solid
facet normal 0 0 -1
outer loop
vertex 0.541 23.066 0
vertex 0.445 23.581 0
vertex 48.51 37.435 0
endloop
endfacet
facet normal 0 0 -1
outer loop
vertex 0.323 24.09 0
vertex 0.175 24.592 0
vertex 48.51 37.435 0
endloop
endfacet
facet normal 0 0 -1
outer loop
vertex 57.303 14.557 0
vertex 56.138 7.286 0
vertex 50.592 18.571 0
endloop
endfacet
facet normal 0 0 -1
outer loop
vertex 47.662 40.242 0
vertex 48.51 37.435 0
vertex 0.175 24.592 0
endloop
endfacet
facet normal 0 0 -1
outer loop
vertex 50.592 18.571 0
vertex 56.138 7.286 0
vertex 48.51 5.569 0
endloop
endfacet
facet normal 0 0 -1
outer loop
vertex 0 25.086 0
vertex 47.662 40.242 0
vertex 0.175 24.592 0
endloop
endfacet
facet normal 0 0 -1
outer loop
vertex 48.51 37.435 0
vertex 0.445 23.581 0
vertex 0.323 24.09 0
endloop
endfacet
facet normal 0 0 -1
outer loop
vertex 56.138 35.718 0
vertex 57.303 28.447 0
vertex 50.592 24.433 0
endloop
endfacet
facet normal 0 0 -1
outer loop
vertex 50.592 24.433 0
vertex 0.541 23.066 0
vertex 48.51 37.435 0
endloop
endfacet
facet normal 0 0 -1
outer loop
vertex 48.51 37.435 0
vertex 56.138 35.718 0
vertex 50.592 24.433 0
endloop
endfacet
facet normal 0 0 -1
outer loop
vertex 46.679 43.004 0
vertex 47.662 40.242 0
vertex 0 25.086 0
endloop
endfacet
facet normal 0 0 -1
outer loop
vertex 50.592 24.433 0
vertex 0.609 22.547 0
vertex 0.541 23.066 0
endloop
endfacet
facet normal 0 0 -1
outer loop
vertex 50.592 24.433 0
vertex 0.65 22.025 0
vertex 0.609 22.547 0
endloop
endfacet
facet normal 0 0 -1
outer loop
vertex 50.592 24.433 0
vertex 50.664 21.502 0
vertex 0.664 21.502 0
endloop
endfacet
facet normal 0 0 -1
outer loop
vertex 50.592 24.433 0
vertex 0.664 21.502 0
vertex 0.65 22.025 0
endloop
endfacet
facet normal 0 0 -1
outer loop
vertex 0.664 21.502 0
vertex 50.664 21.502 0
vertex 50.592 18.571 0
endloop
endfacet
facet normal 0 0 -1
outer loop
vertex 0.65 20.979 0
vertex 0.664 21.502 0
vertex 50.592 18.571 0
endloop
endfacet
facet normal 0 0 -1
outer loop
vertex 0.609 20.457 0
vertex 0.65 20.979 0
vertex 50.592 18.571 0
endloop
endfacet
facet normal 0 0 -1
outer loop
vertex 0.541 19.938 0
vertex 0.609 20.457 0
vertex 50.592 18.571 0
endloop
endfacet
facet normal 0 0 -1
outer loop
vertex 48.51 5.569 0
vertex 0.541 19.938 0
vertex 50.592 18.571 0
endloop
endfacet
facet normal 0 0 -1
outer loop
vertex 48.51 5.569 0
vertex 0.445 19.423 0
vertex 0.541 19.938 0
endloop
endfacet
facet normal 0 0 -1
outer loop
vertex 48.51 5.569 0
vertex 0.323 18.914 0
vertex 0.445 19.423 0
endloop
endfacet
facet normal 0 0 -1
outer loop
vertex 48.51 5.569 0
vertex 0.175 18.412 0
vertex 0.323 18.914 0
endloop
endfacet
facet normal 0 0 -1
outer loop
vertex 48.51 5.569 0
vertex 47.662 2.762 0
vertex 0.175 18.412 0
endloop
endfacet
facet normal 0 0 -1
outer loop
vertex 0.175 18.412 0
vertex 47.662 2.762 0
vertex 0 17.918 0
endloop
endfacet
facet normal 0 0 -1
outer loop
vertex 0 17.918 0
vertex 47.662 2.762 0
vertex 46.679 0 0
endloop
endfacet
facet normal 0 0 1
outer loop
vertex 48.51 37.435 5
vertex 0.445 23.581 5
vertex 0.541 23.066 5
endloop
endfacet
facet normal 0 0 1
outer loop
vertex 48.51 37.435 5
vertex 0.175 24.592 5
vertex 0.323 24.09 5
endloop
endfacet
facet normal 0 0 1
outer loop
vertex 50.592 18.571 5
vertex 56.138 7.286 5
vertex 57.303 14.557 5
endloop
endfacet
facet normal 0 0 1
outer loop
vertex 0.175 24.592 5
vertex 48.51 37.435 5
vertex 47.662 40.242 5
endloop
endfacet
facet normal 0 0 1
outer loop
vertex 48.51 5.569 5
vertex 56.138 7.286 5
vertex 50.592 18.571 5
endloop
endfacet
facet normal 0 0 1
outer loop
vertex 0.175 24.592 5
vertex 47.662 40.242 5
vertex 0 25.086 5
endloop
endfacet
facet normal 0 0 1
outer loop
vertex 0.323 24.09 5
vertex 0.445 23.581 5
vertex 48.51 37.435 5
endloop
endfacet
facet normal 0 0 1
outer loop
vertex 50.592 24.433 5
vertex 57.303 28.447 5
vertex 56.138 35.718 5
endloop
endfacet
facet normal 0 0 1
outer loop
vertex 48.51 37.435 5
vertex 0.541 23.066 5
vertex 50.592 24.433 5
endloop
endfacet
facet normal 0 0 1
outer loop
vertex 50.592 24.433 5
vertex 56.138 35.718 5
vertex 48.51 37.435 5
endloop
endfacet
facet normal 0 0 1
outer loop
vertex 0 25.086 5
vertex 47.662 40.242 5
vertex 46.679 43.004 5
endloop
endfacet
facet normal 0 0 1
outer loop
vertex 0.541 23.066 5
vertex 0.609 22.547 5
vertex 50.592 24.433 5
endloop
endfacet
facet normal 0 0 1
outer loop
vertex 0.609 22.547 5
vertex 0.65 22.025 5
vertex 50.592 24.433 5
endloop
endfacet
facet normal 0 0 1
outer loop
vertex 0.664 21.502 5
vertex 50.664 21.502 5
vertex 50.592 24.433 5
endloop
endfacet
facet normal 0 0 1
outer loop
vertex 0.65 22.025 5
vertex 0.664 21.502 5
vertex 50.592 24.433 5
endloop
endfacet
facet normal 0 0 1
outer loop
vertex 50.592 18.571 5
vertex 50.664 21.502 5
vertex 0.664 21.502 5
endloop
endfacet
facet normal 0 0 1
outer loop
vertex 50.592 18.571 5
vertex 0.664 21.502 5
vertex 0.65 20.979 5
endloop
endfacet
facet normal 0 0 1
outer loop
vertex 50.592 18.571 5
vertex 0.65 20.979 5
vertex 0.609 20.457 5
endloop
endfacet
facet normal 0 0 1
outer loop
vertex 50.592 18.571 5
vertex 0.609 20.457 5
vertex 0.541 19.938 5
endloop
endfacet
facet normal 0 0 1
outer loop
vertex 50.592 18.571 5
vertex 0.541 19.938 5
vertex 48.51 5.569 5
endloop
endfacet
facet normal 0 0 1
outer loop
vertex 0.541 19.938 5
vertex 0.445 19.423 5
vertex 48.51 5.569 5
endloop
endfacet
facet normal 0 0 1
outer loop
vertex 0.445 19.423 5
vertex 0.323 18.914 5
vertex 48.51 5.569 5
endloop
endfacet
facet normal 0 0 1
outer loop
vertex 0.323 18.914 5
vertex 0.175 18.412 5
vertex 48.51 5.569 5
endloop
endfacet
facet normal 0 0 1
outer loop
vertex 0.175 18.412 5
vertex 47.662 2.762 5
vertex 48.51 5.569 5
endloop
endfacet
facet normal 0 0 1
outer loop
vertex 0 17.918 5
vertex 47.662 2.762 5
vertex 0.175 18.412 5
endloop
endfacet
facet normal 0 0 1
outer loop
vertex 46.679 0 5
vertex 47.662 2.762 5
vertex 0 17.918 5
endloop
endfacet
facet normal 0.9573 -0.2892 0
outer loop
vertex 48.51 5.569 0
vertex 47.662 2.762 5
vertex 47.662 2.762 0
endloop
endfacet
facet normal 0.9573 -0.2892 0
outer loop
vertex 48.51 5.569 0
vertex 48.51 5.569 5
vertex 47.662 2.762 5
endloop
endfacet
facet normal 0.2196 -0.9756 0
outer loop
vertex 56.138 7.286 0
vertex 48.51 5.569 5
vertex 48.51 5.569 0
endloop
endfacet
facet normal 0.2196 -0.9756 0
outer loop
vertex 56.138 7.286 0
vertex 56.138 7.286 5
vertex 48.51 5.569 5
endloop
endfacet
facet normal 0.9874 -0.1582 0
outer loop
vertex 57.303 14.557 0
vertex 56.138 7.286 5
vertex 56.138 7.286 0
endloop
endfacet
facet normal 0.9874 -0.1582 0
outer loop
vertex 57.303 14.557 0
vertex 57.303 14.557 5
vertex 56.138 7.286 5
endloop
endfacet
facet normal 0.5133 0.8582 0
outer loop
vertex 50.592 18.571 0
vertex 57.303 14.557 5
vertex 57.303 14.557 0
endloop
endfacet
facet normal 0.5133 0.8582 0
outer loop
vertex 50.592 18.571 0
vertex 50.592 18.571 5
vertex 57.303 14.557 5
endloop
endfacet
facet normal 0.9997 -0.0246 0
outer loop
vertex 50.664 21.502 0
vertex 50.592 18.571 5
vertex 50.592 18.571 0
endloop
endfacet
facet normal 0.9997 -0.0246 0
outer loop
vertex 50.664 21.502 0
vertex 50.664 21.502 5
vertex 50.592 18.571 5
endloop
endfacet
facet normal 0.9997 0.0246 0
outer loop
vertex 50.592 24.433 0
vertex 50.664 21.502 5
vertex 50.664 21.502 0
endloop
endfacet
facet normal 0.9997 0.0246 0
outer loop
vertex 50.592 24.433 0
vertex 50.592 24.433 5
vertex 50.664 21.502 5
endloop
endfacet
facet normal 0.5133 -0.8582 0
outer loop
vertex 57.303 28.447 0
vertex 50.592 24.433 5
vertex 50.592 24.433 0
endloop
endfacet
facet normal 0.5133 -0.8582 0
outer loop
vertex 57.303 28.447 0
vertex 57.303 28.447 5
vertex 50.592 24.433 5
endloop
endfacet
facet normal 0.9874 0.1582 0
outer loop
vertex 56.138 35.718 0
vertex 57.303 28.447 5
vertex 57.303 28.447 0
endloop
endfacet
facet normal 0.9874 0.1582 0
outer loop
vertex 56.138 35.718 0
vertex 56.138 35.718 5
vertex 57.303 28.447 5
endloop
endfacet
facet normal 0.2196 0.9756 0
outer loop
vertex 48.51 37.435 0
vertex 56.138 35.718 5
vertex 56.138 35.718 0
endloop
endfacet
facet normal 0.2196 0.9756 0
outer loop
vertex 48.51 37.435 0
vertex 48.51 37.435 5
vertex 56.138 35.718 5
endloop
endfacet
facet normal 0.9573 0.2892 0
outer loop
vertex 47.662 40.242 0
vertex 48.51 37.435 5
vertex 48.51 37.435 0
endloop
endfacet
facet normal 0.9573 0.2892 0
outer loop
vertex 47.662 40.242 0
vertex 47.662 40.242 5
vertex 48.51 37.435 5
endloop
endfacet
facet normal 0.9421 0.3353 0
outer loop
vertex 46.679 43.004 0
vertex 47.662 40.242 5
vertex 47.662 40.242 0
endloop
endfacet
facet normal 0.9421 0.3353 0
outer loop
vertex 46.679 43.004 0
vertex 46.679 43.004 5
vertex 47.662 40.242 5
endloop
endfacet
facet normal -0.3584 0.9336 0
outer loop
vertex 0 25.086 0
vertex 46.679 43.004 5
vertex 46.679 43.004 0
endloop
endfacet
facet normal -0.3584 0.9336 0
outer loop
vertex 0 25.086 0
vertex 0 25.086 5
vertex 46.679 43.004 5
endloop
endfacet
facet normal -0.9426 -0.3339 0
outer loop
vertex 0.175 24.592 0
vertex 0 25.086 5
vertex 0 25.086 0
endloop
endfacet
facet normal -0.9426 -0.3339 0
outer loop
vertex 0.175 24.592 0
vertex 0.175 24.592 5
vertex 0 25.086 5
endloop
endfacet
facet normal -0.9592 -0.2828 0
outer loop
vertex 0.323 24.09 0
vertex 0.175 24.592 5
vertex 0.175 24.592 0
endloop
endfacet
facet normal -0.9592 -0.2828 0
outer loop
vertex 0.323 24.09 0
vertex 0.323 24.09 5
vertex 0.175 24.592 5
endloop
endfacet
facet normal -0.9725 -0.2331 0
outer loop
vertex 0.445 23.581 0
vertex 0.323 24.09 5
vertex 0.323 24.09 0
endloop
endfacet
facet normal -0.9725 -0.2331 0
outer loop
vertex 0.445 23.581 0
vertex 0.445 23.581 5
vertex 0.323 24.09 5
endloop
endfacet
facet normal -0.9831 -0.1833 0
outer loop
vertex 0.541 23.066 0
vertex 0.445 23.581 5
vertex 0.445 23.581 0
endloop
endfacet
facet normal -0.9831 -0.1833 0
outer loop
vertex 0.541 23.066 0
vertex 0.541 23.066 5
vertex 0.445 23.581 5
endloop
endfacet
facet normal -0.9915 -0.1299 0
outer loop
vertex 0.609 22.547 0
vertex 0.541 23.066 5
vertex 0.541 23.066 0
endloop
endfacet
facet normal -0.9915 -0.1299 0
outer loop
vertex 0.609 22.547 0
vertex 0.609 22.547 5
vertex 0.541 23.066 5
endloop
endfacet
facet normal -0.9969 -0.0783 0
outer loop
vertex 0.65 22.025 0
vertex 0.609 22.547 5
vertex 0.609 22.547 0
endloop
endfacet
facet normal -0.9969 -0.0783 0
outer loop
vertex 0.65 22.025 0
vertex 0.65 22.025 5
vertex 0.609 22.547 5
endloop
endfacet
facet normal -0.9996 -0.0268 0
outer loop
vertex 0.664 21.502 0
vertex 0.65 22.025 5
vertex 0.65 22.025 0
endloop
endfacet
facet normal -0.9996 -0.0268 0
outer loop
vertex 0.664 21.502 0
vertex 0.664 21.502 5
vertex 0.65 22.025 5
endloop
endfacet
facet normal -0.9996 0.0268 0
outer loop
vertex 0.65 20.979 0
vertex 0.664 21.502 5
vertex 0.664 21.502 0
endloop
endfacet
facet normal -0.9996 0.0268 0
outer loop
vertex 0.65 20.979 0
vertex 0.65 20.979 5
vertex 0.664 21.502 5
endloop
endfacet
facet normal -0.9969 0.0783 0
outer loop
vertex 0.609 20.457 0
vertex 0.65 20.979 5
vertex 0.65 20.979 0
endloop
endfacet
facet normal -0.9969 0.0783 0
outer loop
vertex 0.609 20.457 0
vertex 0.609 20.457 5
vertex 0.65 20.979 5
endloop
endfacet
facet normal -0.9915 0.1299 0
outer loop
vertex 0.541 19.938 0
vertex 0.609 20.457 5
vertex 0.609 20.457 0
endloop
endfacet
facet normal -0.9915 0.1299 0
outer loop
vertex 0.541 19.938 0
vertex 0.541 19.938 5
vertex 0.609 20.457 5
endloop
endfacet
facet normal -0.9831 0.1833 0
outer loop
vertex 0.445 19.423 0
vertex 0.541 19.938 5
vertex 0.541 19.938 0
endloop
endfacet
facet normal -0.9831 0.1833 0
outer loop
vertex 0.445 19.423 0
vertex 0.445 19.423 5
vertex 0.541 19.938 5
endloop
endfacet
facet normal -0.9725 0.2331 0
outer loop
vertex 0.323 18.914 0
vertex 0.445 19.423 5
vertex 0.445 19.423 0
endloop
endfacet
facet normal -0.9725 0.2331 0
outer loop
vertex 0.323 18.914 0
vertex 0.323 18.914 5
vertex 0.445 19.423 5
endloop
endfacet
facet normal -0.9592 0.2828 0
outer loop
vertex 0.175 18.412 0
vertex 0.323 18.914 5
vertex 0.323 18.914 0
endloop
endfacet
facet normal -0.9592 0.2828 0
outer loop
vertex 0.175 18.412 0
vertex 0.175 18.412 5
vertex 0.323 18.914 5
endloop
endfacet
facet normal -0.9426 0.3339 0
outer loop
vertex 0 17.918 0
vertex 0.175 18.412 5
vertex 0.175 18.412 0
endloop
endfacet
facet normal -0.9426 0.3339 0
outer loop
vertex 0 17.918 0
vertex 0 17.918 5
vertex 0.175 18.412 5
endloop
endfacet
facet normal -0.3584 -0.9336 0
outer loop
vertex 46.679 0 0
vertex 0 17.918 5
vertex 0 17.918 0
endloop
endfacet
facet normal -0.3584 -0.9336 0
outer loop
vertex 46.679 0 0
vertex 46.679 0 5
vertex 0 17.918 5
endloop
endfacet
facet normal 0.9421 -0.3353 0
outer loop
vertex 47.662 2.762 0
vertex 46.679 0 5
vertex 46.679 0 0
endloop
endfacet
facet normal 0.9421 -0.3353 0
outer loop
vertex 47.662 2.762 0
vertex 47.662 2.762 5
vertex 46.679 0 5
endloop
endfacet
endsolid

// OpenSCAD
$fn = 32;

// ----------------------------------------------------------------------
// Gear sector: 2 teeth on 42 degrees
// ----------------------------------------------------------------------

// --- parameters (mm) ---
sector_angle = 42;        // sector angle, degrees
root_r = 60;              // root circle radius
tooth_h = 7;              // tooth height over the root circle
teeth = 2;                // number of teeth on the sector
hub_r = 10;               // hub bore radius
plate_t = 5;              // sector thickness, Z
arc_step = 3;             // sampling step of the root/hub arcs, degrees

tip_r = root_r + tooth_h;  // tip circle radius

profile = [[46.679, 0], [47.662, 2.762], [48.51, 5.569], [56.138, 7.286], [57.303, 14.557], [50.592, 18.571], [50.664, 21.502], [50.592, 24.433], [57.303, 28.447], [56.138, 35.718], [48.51, 37.435], [47.662, 40.242], [46.679, 43.004], [0, 25.086], [0.175, 24.592], [0.323, 24.09], [0.445, 23.581], [0.541, 23.066], [0.609, 22.547], [0.65, 22.025], [0.664, 21.502], [0.65, 20.979], [0.609, 20.457], [0.541, 19.938], [0.445, 19.423], [0.323, 18.914], [0.175, 18.412], [0, 17.918]];  // primary outline, 28 points, counter clockwise

// --- the one profile operation ---
linear_extrude(height = plate_t) polygon(points = profile);
